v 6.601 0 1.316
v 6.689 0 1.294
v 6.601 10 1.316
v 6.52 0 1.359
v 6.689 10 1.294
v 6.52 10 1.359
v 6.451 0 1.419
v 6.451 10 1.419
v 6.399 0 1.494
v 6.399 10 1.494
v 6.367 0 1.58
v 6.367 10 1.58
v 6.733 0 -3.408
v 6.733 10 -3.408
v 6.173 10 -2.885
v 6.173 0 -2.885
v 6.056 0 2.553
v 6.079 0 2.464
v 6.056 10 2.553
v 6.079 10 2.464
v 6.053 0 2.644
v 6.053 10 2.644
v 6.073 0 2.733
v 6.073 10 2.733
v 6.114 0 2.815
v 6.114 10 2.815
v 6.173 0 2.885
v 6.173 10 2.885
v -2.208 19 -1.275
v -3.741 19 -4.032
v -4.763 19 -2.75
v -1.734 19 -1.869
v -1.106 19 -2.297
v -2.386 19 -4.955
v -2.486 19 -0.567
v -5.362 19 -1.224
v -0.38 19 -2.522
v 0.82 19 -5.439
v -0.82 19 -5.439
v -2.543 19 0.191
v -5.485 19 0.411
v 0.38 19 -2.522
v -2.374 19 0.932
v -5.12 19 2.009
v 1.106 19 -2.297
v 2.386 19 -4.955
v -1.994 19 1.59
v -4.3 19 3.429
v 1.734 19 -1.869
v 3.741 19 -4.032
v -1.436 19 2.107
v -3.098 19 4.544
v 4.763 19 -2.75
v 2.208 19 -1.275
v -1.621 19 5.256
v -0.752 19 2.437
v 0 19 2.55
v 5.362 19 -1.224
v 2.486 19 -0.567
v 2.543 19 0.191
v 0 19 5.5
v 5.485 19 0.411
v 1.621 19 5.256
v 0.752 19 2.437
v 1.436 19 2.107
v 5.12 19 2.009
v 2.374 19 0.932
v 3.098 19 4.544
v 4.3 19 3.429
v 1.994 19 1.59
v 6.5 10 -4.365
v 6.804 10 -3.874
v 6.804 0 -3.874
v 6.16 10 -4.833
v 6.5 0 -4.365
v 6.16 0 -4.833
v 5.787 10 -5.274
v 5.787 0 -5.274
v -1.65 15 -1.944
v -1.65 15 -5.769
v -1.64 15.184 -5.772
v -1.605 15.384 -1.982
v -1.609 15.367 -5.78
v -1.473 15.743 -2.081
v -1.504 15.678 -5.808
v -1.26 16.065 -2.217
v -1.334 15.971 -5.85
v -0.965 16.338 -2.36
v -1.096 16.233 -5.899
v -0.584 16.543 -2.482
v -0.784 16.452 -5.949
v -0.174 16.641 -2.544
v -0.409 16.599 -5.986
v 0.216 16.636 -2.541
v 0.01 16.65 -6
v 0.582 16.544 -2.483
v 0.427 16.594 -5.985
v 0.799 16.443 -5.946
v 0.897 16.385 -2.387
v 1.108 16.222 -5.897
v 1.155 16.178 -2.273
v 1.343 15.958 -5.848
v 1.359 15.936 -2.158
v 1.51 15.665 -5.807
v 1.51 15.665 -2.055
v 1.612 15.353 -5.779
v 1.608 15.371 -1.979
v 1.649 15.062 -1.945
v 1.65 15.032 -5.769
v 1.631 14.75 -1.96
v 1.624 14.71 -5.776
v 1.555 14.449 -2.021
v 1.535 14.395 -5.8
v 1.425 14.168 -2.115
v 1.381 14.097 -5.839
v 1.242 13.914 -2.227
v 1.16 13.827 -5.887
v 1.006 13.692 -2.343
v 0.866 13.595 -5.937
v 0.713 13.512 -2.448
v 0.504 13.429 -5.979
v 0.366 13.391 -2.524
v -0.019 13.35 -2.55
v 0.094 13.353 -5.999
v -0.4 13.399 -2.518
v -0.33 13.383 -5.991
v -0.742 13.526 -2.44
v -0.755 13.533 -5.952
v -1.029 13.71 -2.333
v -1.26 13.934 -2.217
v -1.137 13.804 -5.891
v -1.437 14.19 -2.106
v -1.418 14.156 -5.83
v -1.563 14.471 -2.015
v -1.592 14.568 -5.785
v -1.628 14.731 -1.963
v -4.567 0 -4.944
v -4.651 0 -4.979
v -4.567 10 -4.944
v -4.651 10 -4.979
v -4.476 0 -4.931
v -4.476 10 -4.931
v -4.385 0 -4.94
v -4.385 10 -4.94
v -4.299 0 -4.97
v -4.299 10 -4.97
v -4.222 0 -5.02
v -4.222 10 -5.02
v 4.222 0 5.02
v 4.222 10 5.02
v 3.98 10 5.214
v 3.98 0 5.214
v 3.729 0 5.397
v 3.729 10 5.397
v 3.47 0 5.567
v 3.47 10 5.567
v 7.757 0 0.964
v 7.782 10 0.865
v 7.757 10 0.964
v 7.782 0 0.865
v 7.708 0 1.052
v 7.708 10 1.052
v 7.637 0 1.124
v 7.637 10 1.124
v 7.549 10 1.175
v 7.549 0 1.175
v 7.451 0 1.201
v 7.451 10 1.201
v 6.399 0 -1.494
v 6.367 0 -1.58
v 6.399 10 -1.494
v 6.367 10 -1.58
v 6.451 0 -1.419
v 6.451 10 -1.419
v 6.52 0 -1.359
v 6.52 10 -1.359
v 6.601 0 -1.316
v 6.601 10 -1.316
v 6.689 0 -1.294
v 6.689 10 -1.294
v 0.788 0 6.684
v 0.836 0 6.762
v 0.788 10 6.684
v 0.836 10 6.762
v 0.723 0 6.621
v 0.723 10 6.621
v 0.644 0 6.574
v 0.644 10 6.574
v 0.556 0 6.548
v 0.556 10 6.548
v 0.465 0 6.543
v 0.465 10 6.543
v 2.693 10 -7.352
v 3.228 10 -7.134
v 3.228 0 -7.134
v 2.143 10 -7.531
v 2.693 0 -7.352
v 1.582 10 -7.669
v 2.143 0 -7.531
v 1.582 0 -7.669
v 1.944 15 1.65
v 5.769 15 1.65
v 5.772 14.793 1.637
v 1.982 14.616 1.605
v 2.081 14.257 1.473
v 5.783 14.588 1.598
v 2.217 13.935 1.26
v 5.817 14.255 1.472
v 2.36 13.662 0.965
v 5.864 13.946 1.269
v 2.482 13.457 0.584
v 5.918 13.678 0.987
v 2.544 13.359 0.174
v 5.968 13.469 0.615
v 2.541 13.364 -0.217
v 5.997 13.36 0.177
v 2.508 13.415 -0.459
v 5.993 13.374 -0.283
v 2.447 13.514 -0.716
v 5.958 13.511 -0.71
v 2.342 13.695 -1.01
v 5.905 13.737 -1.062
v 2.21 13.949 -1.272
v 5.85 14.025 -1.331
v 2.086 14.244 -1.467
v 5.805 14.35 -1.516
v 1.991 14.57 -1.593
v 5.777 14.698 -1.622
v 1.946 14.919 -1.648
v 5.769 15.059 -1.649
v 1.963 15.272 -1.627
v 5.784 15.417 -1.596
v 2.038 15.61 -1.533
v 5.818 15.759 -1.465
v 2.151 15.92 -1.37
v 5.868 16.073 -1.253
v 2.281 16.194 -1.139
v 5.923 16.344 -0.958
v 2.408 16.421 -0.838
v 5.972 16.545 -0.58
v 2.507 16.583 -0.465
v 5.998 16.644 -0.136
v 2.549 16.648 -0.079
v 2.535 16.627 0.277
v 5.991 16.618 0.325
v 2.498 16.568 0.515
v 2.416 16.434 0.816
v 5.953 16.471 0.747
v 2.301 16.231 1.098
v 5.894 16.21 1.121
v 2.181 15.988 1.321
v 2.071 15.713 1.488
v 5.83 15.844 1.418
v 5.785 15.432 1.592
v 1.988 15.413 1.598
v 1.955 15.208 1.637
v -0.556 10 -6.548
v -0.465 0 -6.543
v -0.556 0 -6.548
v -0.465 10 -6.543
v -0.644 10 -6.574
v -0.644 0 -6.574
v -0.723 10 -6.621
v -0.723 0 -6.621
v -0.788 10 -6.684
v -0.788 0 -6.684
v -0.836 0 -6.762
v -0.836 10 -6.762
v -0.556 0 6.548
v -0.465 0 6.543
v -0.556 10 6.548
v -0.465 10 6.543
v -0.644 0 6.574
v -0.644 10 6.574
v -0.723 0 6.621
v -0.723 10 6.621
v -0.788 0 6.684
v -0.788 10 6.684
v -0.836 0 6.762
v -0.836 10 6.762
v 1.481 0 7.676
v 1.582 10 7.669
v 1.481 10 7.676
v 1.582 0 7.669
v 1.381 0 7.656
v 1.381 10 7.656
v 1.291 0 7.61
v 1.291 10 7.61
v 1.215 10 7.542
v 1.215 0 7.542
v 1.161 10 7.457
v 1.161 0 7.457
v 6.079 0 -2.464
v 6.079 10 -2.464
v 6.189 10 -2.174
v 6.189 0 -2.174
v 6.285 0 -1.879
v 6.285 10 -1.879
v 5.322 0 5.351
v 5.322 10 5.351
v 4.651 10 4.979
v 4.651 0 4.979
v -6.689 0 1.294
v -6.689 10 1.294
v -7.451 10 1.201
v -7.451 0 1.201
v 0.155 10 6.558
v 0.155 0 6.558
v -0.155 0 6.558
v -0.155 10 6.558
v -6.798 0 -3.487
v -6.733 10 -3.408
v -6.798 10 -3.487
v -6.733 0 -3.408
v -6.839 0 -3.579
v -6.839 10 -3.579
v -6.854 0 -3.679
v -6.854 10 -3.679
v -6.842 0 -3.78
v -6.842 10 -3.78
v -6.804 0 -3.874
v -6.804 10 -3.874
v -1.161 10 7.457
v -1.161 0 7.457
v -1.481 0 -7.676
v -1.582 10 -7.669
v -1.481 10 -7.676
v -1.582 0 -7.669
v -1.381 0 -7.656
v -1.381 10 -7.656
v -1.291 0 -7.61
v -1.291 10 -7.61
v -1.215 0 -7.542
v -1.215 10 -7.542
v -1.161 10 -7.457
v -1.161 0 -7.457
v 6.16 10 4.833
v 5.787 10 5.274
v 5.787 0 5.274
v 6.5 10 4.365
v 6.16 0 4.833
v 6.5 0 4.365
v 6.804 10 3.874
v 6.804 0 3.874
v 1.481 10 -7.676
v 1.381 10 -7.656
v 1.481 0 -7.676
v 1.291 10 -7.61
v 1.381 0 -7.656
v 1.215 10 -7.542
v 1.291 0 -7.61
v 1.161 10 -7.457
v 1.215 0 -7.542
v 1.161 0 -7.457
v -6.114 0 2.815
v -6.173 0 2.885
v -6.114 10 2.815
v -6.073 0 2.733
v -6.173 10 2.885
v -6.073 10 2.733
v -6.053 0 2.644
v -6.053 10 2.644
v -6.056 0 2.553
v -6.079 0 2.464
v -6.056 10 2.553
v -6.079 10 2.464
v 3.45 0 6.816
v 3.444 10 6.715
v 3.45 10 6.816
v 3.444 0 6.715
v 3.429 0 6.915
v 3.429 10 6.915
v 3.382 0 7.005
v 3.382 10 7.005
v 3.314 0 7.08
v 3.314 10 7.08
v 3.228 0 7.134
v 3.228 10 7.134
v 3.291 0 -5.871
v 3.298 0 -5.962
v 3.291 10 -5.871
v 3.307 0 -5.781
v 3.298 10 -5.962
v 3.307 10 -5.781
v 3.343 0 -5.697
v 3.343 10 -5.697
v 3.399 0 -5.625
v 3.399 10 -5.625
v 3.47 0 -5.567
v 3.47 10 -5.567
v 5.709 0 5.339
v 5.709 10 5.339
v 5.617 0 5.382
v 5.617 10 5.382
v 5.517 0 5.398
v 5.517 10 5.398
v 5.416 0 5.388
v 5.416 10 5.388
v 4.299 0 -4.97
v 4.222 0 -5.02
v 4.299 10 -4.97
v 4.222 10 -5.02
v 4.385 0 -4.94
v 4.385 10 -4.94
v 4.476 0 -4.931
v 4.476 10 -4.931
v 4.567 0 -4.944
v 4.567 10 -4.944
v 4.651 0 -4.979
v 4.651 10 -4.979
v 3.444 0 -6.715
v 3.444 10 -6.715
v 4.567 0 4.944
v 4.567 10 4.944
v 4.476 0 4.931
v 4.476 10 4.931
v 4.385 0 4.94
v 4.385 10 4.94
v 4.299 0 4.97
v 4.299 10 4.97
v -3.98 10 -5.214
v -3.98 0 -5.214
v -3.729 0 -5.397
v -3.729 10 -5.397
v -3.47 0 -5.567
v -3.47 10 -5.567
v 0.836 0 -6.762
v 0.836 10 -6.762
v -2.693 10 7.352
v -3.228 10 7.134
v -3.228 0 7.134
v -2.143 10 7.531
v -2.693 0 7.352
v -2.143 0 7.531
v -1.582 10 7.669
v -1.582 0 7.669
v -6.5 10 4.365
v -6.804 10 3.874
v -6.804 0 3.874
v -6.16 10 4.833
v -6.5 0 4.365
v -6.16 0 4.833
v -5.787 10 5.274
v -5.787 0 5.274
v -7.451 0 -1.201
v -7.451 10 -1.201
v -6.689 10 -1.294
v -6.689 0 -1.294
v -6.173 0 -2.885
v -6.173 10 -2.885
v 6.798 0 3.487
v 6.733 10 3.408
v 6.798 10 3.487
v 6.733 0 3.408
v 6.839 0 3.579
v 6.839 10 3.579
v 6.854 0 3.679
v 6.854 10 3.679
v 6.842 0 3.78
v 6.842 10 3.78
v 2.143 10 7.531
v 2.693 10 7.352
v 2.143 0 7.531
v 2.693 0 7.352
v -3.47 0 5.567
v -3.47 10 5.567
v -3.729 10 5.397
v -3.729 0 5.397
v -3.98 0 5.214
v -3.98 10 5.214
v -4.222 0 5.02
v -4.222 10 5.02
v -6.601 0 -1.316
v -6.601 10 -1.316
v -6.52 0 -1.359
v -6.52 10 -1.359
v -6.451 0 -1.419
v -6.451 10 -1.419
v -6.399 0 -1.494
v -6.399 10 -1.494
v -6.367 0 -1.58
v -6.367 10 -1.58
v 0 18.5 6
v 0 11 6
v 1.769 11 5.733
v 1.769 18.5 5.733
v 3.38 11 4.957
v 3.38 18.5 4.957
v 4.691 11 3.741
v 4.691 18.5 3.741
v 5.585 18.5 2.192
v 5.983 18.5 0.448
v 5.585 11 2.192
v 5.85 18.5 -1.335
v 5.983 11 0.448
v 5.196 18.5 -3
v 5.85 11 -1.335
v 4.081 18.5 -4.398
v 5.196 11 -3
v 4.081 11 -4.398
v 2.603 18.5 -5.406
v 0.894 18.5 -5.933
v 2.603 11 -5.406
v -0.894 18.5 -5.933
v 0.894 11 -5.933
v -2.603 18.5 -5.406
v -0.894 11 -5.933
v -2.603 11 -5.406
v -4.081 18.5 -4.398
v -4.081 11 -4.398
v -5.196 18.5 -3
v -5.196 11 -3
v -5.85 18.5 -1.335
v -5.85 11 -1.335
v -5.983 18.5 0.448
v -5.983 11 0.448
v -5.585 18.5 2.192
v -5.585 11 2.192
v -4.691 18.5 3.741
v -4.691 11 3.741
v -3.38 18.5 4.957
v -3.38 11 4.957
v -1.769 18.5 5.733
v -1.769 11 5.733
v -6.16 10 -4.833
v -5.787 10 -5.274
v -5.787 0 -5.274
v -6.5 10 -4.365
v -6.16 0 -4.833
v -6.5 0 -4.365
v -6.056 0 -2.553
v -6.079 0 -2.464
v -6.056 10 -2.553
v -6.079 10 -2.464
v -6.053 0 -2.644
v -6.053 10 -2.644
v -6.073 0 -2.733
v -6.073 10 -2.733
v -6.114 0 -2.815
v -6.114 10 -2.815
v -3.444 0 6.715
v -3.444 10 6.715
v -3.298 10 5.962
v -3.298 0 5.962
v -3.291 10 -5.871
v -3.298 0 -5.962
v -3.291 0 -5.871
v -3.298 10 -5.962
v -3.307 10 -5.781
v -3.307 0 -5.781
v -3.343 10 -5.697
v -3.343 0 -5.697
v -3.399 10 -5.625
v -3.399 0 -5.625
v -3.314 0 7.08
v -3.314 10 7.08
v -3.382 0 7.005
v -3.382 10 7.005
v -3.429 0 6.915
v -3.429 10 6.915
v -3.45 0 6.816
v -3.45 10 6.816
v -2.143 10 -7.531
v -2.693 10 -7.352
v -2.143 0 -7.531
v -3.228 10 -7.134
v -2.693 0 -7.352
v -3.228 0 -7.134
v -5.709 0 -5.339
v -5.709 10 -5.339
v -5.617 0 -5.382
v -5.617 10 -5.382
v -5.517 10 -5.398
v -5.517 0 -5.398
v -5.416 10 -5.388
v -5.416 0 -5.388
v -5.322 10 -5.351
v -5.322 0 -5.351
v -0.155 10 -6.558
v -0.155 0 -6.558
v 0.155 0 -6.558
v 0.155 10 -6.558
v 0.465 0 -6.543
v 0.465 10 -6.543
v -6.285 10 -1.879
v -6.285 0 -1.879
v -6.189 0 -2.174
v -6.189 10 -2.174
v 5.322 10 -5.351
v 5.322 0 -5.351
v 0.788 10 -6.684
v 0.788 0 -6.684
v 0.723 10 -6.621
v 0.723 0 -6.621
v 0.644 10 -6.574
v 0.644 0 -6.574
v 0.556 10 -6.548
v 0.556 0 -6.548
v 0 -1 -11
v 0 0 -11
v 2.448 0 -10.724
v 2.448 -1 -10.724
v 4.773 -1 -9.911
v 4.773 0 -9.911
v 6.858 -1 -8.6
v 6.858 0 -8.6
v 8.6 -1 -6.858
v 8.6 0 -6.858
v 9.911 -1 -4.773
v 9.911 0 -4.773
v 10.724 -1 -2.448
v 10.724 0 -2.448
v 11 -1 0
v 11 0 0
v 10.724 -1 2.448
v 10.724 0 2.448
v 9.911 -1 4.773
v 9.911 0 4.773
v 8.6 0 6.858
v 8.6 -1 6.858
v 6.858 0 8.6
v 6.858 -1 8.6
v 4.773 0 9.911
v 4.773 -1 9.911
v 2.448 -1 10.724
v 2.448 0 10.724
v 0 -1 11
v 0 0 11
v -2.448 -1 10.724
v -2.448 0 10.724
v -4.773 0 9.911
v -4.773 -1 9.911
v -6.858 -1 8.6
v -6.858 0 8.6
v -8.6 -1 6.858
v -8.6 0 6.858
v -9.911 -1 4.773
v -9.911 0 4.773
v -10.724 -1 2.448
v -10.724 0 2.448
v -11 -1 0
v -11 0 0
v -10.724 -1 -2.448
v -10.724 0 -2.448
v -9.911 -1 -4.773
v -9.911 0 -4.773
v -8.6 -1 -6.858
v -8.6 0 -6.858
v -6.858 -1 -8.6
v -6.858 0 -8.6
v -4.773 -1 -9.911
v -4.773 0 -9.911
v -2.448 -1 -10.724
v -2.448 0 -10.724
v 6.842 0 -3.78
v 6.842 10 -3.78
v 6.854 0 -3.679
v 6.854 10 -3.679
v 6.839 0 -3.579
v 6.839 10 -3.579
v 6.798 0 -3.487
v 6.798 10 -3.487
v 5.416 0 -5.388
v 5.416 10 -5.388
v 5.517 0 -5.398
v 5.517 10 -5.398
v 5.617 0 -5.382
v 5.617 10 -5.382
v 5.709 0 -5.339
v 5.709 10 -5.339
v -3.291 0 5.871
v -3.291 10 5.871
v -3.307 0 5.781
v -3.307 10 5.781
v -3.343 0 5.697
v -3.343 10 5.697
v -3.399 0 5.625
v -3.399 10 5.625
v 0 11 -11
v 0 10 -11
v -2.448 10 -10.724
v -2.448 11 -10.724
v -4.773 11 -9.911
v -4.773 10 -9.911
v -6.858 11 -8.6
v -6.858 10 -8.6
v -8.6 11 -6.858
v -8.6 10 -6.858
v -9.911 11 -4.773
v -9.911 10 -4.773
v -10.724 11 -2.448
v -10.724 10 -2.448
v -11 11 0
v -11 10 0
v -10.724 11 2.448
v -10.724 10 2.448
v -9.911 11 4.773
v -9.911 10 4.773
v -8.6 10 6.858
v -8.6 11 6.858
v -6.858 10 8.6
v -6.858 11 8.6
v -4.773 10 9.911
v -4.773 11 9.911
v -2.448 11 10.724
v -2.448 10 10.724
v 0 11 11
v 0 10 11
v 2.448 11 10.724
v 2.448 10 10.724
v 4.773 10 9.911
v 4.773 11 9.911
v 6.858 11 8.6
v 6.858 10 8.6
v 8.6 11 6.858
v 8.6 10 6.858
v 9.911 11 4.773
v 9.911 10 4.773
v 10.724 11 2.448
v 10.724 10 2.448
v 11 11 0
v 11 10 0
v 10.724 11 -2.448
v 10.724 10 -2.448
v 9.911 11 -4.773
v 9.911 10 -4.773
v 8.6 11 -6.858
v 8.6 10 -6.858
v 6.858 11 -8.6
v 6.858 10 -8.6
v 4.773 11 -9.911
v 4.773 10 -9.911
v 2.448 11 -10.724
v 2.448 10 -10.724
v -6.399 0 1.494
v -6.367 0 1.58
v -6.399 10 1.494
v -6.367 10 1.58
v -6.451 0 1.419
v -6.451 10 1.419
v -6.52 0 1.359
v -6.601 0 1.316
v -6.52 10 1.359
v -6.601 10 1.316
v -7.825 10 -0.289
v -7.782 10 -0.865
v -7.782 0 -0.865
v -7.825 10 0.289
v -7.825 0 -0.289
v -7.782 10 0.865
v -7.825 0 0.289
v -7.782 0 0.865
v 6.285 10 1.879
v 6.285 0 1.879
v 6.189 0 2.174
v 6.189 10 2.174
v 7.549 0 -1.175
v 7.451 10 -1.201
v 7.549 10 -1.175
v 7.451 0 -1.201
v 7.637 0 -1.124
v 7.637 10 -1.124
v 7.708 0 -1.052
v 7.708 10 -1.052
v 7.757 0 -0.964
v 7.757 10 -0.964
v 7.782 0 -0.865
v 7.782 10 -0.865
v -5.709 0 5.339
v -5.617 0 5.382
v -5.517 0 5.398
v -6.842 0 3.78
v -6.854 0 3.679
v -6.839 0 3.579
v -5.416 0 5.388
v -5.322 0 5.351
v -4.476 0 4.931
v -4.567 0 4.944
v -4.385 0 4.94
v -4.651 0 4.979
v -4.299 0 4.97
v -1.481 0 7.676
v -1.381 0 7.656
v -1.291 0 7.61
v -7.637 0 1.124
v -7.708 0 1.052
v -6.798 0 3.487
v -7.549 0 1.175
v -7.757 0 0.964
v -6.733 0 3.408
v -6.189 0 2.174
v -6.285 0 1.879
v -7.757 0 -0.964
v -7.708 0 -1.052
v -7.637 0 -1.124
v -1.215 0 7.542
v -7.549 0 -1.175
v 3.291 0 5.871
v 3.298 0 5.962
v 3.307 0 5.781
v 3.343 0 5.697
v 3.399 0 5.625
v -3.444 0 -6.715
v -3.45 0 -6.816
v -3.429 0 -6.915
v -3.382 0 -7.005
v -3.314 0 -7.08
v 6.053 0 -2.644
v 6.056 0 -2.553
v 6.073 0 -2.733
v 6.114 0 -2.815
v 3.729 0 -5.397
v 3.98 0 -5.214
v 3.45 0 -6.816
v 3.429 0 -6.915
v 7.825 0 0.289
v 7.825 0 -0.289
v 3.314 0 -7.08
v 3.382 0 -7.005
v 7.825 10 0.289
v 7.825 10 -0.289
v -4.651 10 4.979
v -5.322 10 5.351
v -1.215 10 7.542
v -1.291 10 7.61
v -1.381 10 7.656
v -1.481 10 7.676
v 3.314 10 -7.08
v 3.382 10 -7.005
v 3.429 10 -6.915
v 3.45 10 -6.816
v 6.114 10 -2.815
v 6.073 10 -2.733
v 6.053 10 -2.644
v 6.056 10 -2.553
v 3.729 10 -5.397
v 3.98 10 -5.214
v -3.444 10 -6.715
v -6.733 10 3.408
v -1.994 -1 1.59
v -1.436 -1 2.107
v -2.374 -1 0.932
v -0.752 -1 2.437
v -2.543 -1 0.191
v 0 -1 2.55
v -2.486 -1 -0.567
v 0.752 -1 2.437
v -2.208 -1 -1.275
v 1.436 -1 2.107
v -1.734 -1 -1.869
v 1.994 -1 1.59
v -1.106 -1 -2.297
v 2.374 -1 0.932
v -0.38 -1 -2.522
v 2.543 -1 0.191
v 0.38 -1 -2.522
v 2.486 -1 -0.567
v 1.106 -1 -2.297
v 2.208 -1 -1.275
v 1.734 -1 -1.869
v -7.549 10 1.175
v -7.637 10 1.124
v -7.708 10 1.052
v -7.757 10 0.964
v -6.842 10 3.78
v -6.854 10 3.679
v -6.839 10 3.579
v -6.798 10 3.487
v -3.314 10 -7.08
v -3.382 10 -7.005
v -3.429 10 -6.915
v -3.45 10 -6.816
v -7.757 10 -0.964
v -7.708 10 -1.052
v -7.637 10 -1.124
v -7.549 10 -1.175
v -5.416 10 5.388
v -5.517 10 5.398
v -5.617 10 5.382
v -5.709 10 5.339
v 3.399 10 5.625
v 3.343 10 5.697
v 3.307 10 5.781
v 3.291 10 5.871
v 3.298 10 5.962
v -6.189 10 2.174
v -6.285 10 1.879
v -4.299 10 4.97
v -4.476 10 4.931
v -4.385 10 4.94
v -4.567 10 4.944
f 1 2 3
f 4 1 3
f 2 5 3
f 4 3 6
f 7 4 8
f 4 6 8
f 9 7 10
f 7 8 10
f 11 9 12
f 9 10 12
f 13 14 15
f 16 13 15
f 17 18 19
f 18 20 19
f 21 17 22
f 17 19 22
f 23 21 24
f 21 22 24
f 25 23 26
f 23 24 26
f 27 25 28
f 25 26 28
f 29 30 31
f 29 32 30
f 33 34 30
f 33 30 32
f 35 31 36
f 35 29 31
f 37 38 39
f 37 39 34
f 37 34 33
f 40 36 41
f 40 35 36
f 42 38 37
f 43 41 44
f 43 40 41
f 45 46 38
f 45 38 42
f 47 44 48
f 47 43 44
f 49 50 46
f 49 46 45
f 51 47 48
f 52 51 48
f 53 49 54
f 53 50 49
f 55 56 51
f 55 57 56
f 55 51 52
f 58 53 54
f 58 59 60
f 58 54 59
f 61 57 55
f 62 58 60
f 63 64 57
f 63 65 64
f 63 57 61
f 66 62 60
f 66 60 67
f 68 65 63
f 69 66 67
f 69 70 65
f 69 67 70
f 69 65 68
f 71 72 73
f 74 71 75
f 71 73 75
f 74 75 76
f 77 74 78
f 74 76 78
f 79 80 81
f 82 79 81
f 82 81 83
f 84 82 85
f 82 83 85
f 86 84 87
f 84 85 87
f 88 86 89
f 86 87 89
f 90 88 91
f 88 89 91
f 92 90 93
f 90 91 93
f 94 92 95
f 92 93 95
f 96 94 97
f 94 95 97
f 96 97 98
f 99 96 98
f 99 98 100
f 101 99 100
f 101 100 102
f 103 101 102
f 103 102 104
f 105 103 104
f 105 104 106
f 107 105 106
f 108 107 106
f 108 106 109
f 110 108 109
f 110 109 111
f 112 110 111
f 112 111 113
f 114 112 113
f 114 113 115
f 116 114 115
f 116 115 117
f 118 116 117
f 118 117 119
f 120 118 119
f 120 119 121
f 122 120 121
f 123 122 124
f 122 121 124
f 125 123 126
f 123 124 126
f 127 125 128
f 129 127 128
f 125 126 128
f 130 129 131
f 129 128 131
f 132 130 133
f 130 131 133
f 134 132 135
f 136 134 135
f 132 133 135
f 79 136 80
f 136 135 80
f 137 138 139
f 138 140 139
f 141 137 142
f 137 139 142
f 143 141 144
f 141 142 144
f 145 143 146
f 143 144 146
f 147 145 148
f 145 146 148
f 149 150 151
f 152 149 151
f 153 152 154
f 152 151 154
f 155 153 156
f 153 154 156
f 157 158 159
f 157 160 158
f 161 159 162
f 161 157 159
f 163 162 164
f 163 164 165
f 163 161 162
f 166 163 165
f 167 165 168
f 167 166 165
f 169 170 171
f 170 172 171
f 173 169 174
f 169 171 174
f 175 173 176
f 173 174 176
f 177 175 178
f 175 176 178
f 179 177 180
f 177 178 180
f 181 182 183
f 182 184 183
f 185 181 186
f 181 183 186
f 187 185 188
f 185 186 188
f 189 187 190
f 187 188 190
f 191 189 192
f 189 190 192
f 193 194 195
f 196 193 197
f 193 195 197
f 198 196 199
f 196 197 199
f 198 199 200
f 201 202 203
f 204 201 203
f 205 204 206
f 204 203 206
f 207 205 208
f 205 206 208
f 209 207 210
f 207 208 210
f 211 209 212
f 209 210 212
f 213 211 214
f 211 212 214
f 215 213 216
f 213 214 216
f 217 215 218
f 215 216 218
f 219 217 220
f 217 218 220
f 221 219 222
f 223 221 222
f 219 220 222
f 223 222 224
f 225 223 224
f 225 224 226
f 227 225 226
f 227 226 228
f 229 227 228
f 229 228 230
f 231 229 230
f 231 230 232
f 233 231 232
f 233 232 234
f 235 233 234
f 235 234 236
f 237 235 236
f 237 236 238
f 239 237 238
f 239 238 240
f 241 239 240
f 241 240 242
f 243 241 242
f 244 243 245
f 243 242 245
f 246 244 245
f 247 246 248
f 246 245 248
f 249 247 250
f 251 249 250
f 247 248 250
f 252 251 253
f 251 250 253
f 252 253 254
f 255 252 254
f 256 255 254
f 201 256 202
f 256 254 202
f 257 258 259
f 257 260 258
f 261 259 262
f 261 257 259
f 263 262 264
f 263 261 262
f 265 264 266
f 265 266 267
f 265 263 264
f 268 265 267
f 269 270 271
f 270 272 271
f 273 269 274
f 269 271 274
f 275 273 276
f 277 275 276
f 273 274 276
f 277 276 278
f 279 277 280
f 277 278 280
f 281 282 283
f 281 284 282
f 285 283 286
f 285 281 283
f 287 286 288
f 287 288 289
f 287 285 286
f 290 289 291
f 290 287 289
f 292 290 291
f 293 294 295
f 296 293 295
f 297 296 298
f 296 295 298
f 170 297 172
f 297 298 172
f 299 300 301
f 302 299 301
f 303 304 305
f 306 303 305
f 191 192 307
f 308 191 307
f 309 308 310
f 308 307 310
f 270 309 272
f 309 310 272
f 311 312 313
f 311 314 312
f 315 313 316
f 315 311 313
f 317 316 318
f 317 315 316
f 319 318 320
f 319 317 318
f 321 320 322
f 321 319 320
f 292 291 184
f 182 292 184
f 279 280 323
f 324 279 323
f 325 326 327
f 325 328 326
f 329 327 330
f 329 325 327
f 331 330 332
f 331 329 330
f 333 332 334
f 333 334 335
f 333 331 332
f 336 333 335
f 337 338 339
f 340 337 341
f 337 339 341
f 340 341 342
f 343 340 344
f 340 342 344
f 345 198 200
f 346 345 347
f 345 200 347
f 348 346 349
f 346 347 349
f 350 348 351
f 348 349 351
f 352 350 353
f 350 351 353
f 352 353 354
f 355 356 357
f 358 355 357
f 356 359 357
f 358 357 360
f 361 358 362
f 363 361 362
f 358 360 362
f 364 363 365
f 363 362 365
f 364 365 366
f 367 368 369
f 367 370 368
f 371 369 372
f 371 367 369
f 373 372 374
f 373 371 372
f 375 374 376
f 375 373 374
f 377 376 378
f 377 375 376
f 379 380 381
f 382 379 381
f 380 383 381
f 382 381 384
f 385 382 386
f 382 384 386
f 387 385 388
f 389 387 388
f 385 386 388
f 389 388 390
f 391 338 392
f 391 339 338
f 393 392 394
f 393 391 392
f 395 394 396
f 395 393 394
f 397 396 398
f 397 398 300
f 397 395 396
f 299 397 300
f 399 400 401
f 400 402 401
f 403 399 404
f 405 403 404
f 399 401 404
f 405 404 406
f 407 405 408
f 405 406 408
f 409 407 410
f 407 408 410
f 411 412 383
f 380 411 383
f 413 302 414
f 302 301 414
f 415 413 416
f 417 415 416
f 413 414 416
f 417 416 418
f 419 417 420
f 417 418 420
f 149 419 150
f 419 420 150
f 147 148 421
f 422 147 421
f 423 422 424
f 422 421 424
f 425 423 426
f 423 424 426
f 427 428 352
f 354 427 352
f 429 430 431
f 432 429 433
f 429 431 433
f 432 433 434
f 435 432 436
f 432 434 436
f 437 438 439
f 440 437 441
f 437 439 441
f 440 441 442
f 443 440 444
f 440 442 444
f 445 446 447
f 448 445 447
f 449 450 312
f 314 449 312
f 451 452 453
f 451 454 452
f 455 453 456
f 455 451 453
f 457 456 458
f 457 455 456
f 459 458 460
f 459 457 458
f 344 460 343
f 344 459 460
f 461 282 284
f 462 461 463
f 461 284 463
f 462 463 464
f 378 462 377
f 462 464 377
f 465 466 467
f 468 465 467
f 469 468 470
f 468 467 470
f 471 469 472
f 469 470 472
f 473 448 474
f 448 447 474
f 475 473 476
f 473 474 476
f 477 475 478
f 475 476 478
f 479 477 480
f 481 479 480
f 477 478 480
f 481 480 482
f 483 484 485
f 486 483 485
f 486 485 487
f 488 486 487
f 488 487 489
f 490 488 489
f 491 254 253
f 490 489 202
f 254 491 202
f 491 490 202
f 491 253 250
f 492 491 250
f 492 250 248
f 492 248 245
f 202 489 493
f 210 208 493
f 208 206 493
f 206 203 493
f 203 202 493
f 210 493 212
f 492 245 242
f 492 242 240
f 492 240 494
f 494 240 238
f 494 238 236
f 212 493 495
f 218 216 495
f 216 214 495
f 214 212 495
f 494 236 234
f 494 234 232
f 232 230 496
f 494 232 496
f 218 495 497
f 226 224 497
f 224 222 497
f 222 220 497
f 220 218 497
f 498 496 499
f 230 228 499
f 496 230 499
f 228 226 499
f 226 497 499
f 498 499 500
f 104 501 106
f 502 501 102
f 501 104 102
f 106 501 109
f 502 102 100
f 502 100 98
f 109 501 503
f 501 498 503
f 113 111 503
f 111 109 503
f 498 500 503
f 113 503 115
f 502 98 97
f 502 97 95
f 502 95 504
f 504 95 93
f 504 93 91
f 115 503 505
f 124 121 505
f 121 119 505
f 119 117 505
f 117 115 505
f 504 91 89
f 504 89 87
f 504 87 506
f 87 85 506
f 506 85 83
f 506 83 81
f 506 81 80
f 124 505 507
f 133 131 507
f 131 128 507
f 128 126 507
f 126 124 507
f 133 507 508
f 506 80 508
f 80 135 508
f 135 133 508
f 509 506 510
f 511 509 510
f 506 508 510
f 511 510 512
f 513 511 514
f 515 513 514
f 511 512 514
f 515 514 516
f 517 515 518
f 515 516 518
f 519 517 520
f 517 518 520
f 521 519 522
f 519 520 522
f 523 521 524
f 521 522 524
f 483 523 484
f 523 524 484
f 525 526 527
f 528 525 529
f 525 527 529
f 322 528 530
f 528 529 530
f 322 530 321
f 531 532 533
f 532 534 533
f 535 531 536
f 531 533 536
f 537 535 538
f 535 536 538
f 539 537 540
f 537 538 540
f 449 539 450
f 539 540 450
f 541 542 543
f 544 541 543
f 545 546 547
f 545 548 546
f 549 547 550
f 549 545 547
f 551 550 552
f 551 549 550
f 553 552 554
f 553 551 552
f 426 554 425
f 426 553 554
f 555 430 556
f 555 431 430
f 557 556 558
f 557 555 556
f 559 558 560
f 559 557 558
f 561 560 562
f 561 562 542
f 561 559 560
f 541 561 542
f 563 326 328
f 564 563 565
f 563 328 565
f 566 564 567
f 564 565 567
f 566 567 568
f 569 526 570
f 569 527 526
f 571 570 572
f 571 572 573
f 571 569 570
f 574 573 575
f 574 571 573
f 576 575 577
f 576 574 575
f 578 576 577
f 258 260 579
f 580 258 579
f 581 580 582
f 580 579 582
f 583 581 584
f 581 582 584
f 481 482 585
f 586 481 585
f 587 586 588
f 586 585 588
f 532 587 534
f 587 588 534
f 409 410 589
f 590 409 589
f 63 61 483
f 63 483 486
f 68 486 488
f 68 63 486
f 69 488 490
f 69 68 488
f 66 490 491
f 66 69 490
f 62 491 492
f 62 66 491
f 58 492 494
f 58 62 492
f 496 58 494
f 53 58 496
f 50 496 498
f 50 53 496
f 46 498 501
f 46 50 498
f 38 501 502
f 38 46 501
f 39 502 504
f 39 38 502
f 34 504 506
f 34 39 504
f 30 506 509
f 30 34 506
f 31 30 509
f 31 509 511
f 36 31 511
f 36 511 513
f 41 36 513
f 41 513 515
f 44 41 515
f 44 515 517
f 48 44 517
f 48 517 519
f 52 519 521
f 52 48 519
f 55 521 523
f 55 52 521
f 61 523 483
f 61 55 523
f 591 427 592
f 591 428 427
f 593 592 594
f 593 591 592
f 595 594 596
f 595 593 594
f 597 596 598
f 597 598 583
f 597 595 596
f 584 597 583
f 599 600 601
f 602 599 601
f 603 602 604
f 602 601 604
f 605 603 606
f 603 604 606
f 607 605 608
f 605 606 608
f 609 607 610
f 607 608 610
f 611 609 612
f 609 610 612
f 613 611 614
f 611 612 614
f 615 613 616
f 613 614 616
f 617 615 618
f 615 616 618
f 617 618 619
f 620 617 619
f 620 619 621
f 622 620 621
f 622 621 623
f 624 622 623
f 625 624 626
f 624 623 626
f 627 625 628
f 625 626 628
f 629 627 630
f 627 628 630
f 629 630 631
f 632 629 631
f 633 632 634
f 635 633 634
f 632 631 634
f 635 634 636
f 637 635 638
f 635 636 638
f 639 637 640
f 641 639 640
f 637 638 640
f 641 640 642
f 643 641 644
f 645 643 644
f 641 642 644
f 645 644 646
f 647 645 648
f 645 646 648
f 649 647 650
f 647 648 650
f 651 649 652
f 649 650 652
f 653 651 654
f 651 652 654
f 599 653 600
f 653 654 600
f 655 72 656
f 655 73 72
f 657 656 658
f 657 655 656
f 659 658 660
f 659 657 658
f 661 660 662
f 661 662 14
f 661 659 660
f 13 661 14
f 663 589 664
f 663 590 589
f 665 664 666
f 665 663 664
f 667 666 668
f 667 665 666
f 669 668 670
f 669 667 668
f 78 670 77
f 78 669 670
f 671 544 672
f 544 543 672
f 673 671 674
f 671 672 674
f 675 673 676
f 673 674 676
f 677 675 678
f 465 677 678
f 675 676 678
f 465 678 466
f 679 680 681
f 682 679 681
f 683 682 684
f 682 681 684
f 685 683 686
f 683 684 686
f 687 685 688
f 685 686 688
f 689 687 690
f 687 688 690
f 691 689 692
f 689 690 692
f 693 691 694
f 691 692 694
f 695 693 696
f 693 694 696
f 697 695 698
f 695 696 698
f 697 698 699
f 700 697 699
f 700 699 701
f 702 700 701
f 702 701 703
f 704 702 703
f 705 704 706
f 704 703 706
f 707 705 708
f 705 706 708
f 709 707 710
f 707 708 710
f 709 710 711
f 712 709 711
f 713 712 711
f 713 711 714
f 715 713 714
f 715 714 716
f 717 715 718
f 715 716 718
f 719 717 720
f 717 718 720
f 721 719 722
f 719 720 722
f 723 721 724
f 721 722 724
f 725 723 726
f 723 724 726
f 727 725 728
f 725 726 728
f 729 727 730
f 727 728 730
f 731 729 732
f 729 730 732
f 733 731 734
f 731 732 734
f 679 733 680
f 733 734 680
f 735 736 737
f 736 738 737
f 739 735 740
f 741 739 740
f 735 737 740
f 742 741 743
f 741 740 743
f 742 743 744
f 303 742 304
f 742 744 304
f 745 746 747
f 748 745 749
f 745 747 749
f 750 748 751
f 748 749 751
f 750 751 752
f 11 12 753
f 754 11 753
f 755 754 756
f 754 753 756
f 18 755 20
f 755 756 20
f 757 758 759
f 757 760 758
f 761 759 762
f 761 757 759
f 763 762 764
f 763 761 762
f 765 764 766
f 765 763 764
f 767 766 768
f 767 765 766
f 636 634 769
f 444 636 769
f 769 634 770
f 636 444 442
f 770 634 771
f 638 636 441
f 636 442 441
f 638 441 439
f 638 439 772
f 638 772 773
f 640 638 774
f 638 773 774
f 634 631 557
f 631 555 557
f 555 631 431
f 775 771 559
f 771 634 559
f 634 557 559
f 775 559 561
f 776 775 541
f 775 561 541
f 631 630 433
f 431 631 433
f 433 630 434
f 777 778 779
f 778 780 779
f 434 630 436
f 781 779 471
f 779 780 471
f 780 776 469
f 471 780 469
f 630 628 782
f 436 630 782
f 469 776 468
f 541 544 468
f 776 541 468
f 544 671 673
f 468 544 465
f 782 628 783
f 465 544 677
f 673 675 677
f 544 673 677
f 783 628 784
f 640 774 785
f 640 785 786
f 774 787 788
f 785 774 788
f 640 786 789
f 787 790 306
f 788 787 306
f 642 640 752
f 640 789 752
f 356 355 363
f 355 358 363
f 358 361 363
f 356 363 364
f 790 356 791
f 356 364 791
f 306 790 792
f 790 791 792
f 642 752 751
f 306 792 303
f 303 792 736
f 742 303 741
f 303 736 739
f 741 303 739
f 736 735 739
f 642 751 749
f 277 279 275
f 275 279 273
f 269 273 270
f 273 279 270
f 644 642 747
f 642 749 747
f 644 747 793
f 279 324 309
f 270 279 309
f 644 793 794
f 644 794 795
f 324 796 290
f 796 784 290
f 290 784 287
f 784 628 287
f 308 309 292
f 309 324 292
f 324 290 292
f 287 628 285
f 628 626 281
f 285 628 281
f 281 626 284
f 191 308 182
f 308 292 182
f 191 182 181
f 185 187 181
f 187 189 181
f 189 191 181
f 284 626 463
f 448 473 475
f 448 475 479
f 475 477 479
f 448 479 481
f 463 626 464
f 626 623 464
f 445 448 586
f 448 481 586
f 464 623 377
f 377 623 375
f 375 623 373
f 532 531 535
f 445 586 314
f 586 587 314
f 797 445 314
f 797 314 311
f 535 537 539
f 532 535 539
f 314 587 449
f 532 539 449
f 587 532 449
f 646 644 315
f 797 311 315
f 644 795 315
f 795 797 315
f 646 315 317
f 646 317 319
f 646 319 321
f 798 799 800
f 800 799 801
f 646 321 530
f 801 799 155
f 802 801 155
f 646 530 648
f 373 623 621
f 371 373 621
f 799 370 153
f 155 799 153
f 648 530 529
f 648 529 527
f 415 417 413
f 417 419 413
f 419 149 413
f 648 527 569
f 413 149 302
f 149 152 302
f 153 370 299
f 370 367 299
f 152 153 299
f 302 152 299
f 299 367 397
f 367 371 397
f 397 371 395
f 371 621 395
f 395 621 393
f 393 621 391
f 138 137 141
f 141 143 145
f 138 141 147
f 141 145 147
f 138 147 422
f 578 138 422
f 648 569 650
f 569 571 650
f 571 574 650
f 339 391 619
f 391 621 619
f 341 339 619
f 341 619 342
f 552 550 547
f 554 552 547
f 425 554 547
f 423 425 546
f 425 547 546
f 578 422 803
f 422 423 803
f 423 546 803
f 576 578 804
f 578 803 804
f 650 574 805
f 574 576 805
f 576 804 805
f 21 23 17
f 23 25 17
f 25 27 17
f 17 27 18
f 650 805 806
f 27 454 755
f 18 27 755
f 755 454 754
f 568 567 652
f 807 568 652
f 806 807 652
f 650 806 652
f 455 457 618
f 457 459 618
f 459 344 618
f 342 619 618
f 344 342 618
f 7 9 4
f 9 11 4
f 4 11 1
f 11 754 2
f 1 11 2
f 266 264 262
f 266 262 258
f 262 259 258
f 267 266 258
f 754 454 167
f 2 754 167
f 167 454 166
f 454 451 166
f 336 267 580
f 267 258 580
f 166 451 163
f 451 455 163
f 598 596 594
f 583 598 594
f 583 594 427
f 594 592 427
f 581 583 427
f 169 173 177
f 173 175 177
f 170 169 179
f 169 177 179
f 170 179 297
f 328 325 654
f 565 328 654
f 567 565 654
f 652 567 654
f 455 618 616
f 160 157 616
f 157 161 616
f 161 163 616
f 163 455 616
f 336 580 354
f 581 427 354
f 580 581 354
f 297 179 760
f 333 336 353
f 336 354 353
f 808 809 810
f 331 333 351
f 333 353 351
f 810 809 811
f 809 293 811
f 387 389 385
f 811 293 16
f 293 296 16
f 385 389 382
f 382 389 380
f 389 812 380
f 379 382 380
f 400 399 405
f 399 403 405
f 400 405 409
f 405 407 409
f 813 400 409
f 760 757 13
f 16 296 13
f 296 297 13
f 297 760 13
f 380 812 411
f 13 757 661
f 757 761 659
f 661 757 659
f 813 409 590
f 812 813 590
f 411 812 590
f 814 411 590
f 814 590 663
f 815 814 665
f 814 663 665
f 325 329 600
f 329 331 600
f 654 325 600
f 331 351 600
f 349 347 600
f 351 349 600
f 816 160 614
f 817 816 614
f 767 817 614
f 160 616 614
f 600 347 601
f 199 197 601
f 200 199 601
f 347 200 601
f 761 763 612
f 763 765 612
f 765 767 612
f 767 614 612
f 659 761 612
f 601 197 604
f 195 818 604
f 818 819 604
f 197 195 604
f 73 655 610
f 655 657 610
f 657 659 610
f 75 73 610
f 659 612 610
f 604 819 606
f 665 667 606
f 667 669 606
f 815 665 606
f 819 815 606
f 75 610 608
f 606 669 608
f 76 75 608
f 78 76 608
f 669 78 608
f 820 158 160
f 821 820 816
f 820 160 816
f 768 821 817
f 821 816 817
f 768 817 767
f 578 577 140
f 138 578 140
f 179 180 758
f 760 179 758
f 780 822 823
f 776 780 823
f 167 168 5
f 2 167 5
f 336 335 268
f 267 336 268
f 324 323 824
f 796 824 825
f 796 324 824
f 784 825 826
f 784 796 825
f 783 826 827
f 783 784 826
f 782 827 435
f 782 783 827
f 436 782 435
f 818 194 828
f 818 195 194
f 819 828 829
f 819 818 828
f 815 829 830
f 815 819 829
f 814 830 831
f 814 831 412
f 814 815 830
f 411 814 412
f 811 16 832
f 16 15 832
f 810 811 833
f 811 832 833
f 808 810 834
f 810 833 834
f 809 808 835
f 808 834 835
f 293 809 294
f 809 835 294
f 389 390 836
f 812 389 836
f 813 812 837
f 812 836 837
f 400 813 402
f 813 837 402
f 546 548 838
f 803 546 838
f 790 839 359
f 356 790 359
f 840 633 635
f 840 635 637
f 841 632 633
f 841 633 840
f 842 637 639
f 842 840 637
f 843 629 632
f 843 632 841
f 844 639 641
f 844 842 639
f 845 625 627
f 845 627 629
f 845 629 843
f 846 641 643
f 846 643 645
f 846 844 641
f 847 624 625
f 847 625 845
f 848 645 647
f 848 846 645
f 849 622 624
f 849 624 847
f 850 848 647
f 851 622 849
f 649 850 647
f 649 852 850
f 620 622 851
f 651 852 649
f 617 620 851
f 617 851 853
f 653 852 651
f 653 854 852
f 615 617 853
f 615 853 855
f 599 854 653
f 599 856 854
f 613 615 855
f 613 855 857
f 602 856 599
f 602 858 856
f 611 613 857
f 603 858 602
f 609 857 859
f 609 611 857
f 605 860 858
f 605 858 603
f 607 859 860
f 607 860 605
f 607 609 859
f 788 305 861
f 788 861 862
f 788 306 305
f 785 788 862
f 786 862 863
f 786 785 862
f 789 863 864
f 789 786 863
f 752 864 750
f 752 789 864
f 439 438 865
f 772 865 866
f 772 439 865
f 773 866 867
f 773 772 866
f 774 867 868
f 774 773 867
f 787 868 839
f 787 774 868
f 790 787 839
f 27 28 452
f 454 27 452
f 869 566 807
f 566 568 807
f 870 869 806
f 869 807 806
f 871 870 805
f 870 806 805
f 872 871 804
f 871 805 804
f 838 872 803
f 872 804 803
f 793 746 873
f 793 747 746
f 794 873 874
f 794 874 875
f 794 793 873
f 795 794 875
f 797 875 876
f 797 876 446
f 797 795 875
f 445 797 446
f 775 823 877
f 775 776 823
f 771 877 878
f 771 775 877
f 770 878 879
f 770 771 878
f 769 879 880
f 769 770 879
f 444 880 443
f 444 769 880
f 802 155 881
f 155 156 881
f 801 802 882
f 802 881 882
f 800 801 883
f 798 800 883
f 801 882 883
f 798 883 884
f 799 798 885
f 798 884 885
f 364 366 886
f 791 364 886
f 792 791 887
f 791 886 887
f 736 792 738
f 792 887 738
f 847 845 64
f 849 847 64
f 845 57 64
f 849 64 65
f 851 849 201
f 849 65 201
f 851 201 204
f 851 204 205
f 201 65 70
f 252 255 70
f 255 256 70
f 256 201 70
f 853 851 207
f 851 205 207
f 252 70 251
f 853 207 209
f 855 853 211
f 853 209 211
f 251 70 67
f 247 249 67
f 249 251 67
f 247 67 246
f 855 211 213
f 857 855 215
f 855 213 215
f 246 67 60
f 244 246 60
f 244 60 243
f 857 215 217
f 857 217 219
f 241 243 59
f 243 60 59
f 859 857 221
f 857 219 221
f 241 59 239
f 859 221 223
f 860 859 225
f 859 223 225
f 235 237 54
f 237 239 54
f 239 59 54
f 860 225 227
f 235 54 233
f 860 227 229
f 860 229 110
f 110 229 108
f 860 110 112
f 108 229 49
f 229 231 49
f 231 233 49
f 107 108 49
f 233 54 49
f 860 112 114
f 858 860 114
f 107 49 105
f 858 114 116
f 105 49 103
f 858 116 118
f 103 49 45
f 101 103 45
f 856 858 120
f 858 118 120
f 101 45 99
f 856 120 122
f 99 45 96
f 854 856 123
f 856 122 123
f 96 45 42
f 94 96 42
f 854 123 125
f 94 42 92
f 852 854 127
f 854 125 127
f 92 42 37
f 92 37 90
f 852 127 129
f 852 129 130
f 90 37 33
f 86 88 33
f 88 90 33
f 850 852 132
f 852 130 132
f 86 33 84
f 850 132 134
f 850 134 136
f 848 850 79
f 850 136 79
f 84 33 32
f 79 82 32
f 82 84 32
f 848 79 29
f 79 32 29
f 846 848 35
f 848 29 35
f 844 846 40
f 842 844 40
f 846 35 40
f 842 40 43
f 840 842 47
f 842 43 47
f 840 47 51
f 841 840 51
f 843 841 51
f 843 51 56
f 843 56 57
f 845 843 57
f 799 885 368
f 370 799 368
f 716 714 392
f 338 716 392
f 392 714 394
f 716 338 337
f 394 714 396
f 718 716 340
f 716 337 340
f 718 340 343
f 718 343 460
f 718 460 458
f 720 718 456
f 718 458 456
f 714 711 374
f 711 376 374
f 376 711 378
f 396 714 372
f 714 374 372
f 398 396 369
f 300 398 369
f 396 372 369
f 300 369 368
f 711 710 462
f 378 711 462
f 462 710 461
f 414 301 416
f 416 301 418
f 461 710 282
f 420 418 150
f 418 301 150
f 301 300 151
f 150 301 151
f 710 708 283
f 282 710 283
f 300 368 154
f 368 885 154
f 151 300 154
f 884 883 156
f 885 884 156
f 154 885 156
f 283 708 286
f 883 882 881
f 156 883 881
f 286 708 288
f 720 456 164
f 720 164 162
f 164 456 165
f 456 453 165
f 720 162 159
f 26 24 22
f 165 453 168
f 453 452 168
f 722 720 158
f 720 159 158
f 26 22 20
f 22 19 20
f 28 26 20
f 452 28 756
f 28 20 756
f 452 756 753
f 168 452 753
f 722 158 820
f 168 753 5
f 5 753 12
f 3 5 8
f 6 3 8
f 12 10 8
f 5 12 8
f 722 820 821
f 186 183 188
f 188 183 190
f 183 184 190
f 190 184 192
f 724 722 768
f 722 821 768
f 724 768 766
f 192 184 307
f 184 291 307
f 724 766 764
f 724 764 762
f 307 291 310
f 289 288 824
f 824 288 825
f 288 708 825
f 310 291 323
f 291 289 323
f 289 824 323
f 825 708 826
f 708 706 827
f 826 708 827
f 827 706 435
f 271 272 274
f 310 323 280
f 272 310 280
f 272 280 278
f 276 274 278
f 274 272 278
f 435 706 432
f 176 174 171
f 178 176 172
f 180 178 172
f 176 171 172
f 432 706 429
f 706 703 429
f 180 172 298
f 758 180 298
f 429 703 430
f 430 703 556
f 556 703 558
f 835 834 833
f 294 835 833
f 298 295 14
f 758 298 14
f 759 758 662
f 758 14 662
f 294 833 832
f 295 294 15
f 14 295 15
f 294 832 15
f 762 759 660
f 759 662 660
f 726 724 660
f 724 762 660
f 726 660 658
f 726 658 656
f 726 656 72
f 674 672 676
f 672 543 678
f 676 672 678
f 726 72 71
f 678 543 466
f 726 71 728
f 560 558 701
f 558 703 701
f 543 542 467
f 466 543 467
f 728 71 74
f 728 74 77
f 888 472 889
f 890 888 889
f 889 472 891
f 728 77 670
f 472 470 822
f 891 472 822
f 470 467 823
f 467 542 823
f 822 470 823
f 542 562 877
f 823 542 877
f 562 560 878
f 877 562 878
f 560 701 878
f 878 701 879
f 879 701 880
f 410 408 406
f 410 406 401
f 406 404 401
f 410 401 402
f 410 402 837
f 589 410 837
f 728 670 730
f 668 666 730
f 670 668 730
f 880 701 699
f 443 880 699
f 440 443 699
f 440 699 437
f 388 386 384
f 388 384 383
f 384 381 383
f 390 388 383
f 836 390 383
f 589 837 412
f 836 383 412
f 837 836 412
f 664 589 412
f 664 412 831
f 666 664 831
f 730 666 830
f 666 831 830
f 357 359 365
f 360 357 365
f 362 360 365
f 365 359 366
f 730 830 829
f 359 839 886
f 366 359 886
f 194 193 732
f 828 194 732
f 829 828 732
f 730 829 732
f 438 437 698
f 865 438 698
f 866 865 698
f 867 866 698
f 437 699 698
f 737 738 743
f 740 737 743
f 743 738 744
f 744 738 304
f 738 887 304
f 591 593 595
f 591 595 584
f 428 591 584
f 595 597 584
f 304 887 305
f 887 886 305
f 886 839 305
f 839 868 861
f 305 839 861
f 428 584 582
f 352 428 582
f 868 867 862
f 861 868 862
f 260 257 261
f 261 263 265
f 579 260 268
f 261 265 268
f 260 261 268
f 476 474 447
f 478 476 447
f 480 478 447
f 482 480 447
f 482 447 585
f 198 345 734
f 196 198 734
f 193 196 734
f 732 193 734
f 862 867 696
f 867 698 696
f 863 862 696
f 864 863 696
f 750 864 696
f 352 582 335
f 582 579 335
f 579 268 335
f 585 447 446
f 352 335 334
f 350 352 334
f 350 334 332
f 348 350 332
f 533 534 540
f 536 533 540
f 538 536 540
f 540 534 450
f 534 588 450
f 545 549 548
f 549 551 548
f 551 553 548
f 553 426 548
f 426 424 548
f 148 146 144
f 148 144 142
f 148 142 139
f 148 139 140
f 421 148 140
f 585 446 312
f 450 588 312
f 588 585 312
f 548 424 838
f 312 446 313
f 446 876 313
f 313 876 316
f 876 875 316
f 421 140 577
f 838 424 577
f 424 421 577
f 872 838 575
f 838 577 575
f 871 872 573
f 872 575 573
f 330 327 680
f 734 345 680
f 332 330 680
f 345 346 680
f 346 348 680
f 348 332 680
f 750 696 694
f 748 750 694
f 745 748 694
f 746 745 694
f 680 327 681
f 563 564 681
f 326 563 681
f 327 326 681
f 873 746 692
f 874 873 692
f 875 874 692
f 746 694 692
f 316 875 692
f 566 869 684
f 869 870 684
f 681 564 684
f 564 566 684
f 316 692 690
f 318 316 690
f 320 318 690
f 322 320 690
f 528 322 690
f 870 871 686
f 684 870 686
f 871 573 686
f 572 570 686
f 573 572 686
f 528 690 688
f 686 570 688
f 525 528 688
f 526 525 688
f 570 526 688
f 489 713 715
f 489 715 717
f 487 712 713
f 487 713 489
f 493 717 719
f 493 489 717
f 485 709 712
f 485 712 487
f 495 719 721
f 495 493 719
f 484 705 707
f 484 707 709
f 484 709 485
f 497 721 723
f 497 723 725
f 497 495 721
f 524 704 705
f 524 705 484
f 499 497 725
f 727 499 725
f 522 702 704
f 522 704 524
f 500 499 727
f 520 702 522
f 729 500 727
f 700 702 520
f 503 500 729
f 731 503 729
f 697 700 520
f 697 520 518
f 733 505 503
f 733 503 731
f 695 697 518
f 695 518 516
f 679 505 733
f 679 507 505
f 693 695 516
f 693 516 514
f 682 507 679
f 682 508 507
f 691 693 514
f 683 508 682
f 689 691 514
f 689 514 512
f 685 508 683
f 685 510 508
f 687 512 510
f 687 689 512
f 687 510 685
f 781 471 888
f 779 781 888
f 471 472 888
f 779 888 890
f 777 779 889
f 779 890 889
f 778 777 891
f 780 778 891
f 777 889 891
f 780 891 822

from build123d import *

# Parameters (mm, degrees)
SKETCH1_R                = 7.83
BOSS_EXTRUDE1_DEPTH      = 10
CUT_EXTRUDE1_DEPTH       = 14.660812567
FILLET1_R                = 0.38
CIRPATTERN1_COUNT        = 10
FILLET1_OF_CIRPATTERN1_R = 0.38
SKETCH3_R                = 2.55
CUT_EXTRUDE2_DEPTH       = 15.840354998
SKETCH4_R                = 11
BOSS_EXTRUDE2_DEPTH      = 1
SKETCH5_R                = 11
BOSS_EXTRUDE3_DEPTH      = 1
SKETCH6_R                = 6
BOSS_EXTRUDE4_DEPTH      = 8
SKETCH7_R                = 2.55
CUT_EXTRUDE3_DEPTH       = 26.337718919
CUT_EXTRUDE3_DEPTH_BACK  = 26.337718919
M4_TAPPED_HOLE1_REACH    = 27.807
M4_TAPPED_HOLE1_BORE_R   = 1.65
M4_TAPPED_HOLE2_REACH    = 27.807
M4_TAPPED_HOLE2_BORE_R   = 1.65
CHAMFER1_SIZE            = 0.5


with BuildPart() as part:
    # Sketch1 → Boss-Extrude1 (new body)
    with BuildSketch(Plane(origin=(0, 0, 0), x_dir=(1, 0, 0), z_dir=(0, 1, 0))):
        with Locations(Location((0, 0, 0), (0, 0, 270))):
            Circle(SKETCH1_R)
    extrude(amount=BOSS_EXTRUDE1_DEPTH)

    # Sketch2 → Cut-Extrude1 (cut, symmetric)
    with BuildSketch(Plane(origin=(0, 2, 0), x_dir=(1, 0, 0), z_dir=(0, 1, 0))):
        with BuildLine():
            Line((-1.285, 7.7238381), (-0.723625557, 6.519966722))
            ThreePointArc((-0.723625557, 6.519966722), (0, 6.56), (0.723625557, 6.519966722))
            Line((0.723625557, 6.519966722), (1.285, 7.7238381))
            ThreePointArc((1.285, 7.7238381), (0, 7.83), (-1.285, 7.7238381))
        make_face()
    cut_extrude1 = extrude(amount=CUT_EXTRUDE1_DEPTH, both=True, mode=Mode.SUBTRACT)

    # Fillet1
    fillet1_edges = [part.edges().sort_by_distance(p)[0] for p in [
        (1.285, 5, -7.7238381),
        (0.723625557, 5, -6.519966722),
        (-0.723625557, 5, -6.519966722),
        (-1.285, 5, -7.7238381),
    ]]
    fillet(fillet1_edges, radius=FILLET1_R)

    # CirPattern1: Cut-Extrude1 ×10 about axis
    cirpattern1_axis = Axis((0, 0, 0), (0, 1, 0))
    for i in range(1, CIRPATTERN1_COUNT):
        add(cut_extrude1.rotate(cirpattern1_axis, i * 360 / CIRPATTERN1_COUNT), mode=Mode.SUBTRACT)

    # Fillet1 of CirPattern1
    fillet1_of_cirpattern1_edges = [part.edges().sort_by_distance(p)[0] for p in [
        (-3.500371289, 5, -7.004020334),
        (-3.246914912, 5, -5.700100311),
        (-4.417765658, 5, -4.84942745),
        (-5.579544964, 5, -5.493412236),
        (-6.948719718, 5, -3.608904858),
        (-5.977244242, 5, -2.702989321),
        (-6.424469431, 5, -1.326571719),
        (-7.742893394, 5, -1.164689611),
        (-7.742893394, 5, 1.164689611),
        (-6.424469431, 5, 1.326571719),
        (-5.977244242, 5, 2.702989321),
        (-6.948719718, 5, 3.608904858),
        (-5.579544964, 5, 5.493412236),
        (-4.417765658, 5, 4.84942745),
        (-3.246914912, 5, 5.700100311),
        (-3.500371289, 5, 7.004020334),
        (-1.285, 5, 7.7238381),
        (-0.723625557, 5, 6.519966722),
        (0.723625557, 5, 6.519966722),
        (1.285, 5, 7.7238381),
        (3.500371289, 5, 7.004020334),
        (3.246914912, 5, 5.700100311),
        (4.417765658, 5, 4.84942745),
        (5.579544964, 5, 5.493412236),
        (6.948719718, 5, 3.608904858),
        (5.977244242, 5, 2.702989321),
        (6.424469431, 5, 1.326571719),
        (7.742893394, 5, 1.164689611),
        (7.742893394, 5, -1.164689611),
        (6.424469431, 5, -1.326571719),
        (5.977244242, 5, -2.702989321),
        (6.948719718, 5, -3.608904858),
        (5.579544964, 5, -5.493412236),
        (4.417765658, 5, -4.84942745),
        (3.246914912, 5, -5.700100311),
        (3.500371289, 5, -7.004020334),
    ]]
    fillet(fillet1_of_cirpattern1_edges, radius=FILLET1_OF_CIRPATTERN1_R)

    # Sketch3 → Cut-Extrude2 (cut, through all)
    with BuildSketch(Plane(origin=(0, 10, 0), x_dir=(1, 0, 0), z_dir=(0, 1, 0))):
        with Locations(Location((0, 0, 0), (0, 0, 270))):
            Circle(SKETCH3_R)
    extrude(amount=-CUT_EXTRUDE2_DEPTH, mode=Mode.SUBTRACT)

    # Sketch4 → Boss-Extrude2 (add)
    with BuildSketch(Plane.XZ):
        with Locations(Location((0, 0, 0), (0, 0, 270))):
            Circle(SKETCH4_R)
    extrude(amount=BOSS_EXTRUDE2_DEPTH)

    # Sketch5 → Boss-Extrude3 (add)
    with BuildSketch(Plane(origin=(0, 10, 0), x_dir=(1, 0, 0), z_dir=(0, 1, 0))):
        with Locations(Location((0, 0, 0), (0, 0, 90))):
            Circle(SKETCH5_R)
    extrude(amount=BOSS_EXTRUDE3_DEPTH)

    # Sketch6 → Boss-Extrude4 (add)
    with BuildSketch(Plane(origin=(0, 11, 0), x_dir=(1, 0, 0), z_dir=(0, 1, 0))):
        with Locations(Location((0, 0, 0), (0, 0, 270))):
            Circle(SKETCH6_R)
    extrude(amount=BOSS_EXTRUDE4_DEPTH)

    # Sketch7 → Cut-Extrude3 (cut, two sides)
    with BuildSketch(Plane(origin=(0, 19, 0), x_dir=(1, 0, 0), z_dir=(0, 1, 0))) as cut_extrude3_sk:
        with Locations(Location((0, 0, 0), (0, 0, 270))):
            Circle(SKETCH7_R)
    extrude(amount=CUT_EXTRUDE3_DEPTH, mode=Mode.SUBTRACT)
    extrude(cut_extrude3_sk.sketch, amount=-CUT_EXTRUDE3_DEPTH_BACK, mode=Mode.SUBTRACT)

    # M4 Tapped Hole1 bore (on position points) → M4 Tapped Hole1 (cut, up to next)
    with BuildSketch(Plane(origin=(0, 15, -6), x_dir=(-1, 0, 0), z_dir=(0, 0, -1)), mode=Mode.PRIVATE) as m4_tapped_hole1_sk1:
        Circle(M4_TAPPED_HOLE1_BORE_R)
    m4_tapped_hole1_tool1 = extrude(m4_tapped_hole1_sk1.sketch, amount=-M4_TAPPED_HOLE1_REACH, mode=Mode.PRIVATE) & part.part
    add(m4_tapped_hole1_tool1.solids().sort_by_distance((0, 15, -6))[0], mode=Mode.SUBTRACT)

    # M4 Tapped Hole2 bore (on position points) → M4 Tapped Hole2 (cut, up to next)
    with BuildSketch(Plane(origin=(6, 15, 0), x_dir=(0, 0, 1), z_dir=(1, 0, 0)), mode=Mode.PRIVATE) as m4_tapped_hole2_sk1:
        Circle(M4_TAPPED_HOLE2_BORE_R)
    m4_tapped_hole2_tool1 = extrude(m4_tapped_hole2_sk1.sketch, amount=-M4_TAPPED_HOLE2_REACH, mode=Mode.PRIVATE) & part.part
    add(m4_tapped_hole2_tool1.solids().sort_by_distance((6, 15, 0))[0], mode=Mode.SUBTRACT)

    # Chamfer1
    chamfer1_edges = [part.edges().sort_by_distance(p)[0] for p in [
        (0, 19, -6),
    ]]
    chamfer(chamfer1_edges, length=CHAMFER1_SIZE)


solid = part.part
